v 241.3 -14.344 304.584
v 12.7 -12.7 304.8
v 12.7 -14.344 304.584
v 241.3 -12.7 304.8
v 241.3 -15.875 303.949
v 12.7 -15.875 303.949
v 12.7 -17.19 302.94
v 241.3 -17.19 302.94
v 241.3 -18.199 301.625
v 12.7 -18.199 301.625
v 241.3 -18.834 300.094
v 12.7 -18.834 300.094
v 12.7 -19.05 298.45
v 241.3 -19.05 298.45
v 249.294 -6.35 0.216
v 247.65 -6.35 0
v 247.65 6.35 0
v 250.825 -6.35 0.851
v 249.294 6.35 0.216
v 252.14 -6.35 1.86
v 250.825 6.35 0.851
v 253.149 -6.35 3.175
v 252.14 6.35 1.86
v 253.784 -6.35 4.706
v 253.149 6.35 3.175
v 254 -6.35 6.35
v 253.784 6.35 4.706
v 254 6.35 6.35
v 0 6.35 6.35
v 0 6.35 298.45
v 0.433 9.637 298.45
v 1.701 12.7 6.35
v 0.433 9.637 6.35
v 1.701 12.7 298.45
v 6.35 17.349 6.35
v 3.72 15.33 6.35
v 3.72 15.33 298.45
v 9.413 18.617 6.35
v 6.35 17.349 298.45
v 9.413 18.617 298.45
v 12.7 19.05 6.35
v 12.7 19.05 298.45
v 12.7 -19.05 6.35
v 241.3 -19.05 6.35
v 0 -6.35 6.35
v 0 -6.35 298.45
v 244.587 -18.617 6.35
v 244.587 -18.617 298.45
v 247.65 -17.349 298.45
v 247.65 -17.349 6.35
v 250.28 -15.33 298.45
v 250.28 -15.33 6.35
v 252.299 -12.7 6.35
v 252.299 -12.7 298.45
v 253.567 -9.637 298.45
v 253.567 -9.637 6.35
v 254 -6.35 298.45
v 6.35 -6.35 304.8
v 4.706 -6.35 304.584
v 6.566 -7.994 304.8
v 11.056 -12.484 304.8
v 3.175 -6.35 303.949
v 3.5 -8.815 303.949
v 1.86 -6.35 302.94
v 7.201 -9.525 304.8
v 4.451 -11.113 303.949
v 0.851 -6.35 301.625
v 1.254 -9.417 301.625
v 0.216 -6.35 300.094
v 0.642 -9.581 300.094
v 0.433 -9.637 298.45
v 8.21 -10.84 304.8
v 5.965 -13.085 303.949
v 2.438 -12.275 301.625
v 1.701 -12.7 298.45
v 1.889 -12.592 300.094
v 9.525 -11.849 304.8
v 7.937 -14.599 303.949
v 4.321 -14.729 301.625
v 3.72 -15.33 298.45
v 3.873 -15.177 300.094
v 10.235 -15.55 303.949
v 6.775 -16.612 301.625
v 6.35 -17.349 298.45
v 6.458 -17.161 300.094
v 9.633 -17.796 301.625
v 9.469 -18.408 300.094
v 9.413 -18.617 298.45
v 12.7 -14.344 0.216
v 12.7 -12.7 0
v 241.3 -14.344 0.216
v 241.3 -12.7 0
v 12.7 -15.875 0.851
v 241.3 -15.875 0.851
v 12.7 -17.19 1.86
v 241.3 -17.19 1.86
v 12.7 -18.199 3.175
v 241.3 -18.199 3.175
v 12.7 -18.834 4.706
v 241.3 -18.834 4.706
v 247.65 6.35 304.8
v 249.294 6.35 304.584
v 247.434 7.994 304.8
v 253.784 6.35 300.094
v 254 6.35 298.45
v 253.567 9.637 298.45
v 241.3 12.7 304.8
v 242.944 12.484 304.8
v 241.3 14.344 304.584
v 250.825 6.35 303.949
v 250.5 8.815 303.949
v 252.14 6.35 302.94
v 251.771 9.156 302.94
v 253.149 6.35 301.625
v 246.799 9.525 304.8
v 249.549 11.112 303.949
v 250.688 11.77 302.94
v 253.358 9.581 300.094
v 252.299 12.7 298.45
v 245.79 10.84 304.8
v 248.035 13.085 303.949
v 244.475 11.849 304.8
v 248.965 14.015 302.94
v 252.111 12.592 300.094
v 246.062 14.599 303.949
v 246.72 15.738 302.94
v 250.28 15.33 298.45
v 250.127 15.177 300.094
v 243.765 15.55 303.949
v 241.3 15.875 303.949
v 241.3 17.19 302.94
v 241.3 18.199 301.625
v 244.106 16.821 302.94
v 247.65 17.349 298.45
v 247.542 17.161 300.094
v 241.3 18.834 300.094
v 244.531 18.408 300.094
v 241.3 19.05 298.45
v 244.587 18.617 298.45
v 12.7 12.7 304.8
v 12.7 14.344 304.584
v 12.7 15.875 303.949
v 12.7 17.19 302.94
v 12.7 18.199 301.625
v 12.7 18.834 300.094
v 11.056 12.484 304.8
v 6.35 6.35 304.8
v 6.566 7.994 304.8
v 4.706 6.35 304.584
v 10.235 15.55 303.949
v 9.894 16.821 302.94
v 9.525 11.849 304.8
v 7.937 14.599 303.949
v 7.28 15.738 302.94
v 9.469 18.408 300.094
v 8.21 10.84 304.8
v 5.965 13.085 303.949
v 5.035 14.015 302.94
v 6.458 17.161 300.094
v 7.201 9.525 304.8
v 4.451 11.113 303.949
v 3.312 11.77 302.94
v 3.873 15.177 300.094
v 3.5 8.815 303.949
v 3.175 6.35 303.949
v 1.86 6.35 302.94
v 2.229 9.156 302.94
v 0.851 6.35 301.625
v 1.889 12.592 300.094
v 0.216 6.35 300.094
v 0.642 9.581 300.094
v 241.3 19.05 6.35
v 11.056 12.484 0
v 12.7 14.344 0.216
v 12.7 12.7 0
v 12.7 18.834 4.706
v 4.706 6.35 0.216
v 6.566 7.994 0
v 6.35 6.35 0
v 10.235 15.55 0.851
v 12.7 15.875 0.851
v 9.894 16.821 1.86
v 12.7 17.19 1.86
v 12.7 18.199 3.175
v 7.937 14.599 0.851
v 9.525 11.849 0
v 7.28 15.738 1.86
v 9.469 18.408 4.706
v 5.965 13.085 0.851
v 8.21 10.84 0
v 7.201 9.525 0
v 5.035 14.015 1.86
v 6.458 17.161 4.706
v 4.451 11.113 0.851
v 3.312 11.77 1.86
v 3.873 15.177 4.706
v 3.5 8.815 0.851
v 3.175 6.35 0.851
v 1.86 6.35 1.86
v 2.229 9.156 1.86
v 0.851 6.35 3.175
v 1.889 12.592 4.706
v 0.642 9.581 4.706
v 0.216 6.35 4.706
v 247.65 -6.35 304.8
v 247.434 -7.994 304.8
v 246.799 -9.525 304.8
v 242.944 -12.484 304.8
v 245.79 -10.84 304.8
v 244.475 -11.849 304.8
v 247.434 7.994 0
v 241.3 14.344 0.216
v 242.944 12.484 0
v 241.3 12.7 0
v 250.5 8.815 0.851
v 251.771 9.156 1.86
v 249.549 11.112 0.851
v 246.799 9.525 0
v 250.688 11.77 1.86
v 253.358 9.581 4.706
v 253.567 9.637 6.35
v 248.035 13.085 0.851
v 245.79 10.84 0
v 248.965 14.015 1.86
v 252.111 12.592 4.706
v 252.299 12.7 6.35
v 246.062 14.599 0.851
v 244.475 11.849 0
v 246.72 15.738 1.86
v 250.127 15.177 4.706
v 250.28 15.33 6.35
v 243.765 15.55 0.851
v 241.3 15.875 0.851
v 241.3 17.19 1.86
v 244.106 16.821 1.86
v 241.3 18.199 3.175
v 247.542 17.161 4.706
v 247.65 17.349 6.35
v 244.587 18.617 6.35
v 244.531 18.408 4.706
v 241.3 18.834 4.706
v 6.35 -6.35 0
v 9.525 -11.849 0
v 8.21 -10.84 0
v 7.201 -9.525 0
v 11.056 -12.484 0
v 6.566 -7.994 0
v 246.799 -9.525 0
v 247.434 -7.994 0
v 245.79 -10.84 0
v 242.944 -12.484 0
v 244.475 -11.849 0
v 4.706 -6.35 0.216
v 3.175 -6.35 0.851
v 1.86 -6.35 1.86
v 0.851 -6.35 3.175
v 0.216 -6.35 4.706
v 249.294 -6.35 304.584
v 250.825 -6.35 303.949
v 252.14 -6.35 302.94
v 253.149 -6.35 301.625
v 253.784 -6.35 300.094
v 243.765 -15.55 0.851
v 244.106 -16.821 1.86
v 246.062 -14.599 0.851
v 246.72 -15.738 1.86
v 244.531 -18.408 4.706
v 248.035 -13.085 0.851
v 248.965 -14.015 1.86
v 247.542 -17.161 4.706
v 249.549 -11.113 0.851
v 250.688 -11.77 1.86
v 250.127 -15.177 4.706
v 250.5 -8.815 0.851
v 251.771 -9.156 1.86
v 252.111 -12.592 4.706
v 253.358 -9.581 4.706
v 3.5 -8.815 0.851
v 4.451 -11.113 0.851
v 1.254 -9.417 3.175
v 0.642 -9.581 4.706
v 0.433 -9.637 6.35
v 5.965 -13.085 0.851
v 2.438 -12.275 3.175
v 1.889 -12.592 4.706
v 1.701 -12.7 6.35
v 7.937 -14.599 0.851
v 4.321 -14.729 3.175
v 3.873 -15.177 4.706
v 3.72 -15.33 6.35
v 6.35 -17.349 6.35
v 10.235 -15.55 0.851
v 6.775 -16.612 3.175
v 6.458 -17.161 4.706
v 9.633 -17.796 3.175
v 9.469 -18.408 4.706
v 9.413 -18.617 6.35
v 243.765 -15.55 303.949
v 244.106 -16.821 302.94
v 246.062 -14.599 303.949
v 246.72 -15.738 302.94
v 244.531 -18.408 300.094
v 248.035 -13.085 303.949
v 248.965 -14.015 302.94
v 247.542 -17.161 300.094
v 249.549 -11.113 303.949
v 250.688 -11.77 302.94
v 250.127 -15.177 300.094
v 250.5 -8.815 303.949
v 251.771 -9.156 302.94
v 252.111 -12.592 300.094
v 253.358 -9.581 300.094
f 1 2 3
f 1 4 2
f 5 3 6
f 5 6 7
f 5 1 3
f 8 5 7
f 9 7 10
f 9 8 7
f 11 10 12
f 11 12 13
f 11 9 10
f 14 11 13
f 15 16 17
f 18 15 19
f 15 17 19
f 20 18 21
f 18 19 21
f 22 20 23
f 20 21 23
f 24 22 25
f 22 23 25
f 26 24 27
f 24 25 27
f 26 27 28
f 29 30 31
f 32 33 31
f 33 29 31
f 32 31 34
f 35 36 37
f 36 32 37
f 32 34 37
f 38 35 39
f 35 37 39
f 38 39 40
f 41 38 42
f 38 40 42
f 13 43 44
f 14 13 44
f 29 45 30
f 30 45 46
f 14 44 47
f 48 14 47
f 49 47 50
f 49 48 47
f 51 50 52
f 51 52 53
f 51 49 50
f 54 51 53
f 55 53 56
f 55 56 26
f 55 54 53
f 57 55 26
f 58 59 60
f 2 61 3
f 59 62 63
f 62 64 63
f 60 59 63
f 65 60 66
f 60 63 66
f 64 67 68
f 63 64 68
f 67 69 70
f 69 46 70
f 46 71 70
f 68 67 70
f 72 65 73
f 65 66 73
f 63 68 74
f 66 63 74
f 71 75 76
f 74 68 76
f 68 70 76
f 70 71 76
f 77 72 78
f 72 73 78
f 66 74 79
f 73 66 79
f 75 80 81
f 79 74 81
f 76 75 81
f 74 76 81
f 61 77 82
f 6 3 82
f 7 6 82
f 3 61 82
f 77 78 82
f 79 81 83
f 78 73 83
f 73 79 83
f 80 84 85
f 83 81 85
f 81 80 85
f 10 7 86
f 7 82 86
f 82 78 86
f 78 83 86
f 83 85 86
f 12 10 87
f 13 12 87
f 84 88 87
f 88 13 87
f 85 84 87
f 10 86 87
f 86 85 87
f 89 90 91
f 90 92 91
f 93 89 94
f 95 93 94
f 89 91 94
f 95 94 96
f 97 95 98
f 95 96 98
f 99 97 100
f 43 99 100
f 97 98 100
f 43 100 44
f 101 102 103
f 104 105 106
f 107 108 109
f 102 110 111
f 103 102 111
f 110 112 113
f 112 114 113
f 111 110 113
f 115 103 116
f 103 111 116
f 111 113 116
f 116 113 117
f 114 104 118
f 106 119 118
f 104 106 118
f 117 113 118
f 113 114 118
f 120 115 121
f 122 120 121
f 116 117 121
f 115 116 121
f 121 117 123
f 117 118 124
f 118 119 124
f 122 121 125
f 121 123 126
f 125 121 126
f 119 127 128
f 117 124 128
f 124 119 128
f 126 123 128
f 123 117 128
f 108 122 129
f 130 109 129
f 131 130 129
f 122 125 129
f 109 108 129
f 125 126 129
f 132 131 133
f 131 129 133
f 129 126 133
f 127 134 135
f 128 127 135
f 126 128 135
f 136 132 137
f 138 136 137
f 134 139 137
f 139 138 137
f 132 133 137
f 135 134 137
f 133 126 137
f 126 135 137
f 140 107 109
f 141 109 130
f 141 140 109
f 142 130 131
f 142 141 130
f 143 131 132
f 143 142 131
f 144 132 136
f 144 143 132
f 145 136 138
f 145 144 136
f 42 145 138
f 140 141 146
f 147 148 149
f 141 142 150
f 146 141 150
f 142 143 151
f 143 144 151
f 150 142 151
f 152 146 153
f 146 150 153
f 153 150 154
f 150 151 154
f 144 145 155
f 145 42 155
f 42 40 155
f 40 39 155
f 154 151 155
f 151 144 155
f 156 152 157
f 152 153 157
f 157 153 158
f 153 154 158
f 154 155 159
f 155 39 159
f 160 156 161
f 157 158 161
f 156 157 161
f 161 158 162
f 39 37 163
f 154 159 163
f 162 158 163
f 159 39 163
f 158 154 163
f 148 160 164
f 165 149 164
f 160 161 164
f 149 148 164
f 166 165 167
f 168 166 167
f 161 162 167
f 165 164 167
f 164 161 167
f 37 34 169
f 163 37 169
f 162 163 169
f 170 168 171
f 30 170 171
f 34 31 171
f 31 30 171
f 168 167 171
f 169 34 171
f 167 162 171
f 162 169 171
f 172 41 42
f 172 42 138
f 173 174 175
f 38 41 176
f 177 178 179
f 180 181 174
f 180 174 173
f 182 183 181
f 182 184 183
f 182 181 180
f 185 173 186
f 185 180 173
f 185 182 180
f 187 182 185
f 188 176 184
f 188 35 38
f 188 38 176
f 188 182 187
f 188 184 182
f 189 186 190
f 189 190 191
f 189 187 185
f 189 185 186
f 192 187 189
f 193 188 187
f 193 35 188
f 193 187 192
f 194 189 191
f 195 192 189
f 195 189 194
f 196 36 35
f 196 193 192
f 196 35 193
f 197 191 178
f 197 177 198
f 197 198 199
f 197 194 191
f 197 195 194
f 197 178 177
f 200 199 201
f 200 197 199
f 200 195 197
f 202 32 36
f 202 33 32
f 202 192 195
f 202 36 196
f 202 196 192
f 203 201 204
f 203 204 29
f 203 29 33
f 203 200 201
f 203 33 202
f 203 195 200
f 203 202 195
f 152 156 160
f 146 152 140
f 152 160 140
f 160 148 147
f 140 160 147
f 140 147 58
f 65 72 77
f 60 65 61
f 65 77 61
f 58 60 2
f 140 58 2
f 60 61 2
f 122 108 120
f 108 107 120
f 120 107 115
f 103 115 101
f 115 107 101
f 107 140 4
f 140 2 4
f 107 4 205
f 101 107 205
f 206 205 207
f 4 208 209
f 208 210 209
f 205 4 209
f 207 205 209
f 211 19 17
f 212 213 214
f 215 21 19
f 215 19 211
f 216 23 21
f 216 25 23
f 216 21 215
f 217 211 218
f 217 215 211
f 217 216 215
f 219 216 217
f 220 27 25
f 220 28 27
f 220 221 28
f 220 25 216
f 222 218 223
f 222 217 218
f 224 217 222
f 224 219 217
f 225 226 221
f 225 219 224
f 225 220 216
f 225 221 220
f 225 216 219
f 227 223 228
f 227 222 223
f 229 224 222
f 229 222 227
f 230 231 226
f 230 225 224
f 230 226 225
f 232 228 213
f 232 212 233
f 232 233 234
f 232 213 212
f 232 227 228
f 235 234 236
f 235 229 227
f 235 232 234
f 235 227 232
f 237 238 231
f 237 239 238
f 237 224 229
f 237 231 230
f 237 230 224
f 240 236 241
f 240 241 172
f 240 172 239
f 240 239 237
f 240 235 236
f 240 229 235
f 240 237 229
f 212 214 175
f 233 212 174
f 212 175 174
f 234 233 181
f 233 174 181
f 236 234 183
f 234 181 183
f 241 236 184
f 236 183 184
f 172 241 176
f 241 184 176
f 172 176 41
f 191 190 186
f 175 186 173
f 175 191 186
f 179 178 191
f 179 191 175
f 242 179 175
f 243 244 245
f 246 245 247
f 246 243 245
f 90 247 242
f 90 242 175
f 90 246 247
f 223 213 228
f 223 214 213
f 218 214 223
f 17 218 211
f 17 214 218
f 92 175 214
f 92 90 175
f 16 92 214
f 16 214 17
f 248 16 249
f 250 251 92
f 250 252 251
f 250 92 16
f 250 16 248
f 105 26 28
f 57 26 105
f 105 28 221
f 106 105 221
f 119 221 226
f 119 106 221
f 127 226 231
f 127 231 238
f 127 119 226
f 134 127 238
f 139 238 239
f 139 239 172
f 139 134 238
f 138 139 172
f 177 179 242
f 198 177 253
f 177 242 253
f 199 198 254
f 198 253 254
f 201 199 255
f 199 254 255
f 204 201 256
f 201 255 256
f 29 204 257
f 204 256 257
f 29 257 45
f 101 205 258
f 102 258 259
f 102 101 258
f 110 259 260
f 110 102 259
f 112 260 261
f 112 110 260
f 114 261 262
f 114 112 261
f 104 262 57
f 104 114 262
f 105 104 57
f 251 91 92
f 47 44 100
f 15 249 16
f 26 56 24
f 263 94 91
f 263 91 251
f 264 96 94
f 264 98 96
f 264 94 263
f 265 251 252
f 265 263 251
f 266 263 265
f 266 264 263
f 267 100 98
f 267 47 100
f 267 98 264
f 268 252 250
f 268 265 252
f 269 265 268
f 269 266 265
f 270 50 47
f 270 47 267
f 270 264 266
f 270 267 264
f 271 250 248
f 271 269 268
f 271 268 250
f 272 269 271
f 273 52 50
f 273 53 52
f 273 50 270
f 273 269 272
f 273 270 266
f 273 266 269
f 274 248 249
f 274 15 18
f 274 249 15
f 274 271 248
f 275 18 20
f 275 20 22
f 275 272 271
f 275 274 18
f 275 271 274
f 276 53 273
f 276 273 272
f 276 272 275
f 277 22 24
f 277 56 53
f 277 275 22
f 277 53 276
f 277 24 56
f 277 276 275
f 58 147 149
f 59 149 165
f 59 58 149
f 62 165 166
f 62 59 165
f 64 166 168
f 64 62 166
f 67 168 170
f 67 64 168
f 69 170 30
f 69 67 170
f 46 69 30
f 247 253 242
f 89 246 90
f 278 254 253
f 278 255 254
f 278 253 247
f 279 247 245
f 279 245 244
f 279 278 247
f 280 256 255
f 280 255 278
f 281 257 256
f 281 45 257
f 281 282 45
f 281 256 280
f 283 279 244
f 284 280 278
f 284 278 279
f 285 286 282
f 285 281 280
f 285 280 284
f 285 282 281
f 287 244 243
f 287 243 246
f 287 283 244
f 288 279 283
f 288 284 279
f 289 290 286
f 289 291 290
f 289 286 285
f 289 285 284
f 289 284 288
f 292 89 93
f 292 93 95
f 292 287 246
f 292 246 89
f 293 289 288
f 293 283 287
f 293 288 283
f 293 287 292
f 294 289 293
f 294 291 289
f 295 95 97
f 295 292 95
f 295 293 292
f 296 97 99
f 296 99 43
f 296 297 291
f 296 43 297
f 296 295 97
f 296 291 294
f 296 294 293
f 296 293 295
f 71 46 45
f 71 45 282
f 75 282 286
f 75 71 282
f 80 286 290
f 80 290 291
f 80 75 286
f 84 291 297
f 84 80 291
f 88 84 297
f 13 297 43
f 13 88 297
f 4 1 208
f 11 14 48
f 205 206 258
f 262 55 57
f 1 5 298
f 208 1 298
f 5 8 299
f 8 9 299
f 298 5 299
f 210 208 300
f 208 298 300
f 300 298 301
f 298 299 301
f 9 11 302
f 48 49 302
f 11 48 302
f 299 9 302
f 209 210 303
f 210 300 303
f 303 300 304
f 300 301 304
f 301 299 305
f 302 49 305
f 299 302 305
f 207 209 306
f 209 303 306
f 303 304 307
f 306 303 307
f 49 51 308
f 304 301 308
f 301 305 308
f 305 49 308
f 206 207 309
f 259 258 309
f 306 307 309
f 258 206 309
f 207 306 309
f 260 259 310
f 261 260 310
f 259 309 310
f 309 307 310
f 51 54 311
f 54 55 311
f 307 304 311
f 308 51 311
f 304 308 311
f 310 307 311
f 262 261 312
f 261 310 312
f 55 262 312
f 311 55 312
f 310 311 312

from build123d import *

# Parameters (mm, degrees)
F0_W     = 254
F0_H     = 304.8
F1_DEPTH = 19.05
F2_R     = 12.7
F3_R     = 6.35


with BuildPart() as f1:
    # F0 (on Front) → F1 (new body, symmetric)
    with BuildSketch(Plane.XZ):
        with Locations((127, 152.4)):
            Rectangle(F0_W, F0_H)
    extrude(amount=F1_DEPTH, both=True)

    # F2
    f2_edges = [f1.edges().sort_by_distance(p)[0] for p in [
        (0, -19.05, 152.4),
        (254, -19.05, 152.4),
        (254, 19.05, 152.4),
        (0, 19.05, 152.4),
    ]]
    fillet(f2_edges, radius=F2_R)

    # F3
    f3_edges = [f1.edges().sort_by_distance(p)[0] for p in [
        (127, -19.05, 304.8),
        (127, -19.05, 0),
    ]]
    fillet(f3_edges, radius=F3_R)


solid = f1.part
